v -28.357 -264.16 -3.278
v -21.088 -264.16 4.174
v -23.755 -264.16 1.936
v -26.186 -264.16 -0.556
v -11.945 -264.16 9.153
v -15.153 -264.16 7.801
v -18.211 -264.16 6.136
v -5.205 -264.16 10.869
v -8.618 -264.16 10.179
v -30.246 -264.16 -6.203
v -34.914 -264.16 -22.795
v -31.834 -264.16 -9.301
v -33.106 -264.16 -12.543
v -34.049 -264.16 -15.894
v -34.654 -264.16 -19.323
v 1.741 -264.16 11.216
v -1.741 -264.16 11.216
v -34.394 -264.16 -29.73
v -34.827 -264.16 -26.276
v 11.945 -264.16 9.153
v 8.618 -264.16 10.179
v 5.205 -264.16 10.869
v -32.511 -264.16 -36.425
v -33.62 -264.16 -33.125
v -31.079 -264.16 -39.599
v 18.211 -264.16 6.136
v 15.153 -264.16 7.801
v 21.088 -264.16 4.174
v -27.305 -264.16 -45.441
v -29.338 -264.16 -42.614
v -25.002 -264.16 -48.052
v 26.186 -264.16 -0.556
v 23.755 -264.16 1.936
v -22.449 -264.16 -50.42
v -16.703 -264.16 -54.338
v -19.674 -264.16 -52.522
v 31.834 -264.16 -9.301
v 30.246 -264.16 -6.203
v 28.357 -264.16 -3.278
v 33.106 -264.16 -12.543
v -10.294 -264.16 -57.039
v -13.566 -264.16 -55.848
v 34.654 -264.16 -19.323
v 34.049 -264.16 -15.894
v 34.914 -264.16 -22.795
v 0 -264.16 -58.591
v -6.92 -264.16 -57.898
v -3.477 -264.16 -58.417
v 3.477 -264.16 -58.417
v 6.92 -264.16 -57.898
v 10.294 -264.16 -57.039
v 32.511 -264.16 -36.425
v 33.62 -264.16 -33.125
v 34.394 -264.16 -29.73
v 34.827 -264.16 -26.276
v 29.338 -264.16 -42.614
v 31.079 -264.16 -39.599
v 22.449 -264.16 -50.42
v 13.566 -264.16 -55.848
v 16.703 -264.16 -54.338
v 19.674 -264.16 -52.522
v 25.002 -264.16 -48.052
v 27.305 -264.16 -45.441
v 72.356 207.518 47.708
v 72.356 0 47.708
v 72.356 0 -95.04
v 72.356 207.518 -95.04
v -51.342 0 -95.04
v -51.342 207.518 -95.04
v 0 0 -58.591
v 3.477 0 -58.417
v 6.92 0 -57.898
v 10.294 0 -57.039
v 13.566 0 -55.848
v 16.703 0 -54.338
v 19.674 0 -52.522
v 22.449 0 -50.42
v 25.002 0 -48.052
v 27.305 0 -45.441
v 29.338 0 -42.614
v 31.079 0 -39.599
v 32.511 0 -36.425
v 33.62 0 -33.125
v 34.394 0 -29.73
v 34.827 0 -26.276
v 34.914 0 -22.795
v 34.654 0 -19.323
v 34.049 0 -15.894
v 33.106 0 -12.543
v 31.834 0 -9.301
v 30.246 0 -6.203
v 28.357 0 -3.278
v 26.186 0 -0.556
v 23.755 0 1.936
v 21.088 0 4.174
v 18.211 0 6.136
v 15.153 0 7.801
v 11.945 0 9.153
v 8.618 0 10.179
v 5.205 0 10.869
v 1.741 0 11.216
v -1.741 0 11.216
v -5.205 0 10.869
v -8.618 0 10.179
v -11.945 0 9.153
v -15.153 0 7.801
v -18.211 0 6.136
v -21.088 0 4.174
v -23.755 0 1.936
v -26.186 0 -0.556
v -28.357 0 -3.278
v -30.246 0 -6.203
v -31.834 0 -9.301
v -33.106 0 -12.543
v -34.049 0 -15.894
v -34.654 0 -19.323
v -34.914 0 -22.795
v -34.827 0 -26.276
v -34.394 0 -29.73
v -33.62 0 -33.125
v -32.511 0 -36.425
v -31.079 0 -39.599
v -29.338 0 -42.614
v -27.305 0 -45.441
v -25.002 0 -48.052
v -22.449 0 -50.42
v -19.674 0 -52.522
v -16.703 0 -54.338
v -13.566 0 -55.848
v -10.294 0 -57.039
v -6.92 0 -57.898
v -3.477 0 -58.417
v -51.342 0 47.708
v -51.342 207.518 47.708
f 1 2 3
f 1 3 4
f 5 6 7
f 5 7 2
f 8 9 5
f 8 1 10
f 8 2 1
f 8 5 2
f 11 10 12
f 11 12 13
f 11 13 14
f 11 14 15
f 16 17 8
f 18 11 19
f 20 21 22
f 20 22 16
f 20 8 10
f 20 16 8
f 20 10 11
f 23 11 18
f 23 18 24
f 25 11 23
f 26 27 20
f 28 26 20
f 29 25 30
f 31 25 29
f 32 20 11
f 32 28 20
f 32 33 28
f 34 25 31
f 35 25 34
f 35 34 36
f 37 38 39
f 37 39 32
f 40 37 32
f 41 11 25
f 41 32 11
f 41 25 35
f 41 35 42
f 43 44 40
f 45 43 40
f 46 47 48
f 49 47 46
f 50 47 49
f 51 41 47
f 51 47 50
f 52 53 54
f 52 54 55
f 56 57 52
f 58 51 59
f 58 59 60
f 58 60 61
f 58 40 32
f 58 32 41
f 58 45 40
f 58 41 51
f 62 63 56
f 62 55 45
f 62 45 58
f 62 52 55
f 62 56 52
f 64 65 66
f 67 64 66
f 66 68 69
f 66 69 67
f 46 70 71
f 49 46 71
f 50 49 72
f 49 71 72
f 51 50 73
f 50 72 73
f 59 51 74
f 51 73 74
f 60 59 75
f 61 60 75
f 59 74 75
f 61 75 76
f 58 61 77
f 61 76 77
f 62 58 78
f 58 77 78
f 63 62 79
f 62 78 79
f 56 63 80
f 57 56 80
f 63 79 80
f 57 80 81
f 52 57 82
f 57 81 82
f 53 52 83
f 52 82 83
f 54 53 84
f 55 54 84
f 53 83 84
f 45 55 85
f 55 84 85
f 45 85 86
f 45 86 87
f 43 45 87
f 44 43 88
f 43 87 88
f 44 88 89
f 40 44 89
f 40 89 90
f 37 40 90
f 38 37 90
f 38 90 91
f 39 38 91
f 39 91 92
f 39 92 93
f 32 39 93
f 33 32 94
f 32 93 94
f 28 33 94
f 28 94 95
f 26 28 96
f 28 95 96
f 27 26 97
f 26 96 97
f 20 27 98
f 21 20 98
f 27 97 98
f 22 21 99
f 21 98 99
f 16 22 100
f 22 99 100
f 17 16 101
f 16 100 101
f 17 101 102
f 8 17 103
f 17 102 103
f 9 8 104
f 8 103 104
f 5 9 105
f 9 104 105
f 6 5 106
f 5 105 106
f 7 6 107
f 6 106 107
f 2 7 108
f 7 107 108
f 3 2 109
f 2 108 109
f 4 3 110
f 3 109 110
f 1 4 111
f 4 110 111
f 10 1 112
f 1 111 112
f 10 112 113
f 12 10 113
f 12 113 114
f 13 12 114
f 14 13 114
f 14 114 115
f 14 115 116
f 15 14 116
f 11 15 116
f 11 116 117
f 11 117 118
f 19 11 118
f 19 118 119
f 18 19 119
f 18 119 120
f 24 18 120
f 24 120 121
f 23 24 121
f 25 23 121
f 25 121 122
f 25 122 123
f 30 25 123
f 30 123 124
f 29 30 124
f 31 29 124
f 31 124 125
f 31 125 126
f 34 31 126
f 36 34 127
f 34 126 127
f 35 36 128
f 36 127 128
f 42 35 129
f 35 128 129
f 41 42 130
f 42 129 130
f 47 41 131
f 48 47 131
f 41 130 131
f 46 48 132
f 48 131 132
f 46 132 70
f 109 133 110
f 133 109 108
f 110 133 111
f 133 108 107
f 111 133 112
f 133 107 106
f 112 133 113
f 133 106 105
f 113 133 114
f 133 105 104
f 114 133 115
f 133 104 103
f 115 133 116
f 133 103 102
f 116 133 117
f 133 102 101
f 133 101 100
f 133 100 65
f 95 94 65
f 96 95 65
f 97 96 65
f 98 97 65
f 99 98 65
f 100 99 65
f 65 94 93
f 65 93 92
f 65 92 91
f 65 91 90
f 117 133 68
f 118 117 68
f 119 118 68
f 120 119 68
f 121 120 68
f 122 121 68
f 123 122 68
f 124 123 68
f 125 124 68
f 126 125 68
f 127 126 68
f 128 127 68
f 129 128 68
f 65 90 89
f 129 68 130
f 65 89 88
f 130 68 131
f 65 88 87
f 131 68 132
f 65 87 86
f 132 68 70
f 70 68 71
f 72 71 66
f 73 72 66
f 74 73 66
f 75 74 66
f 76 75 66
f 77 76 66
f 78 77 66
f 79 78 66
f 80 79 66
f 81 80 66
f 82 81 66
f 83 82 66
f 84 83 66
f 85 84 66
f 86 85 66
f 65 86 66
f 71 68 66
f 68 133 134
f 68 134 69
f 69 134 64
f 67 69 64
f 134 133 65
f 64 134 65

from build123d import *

# Parameters (mm, degrees)
SKETCH1_W      = 123.698
SKETCH1_H      = 142.748
EXTRUDE1_DEPTH = 207.518
SKETCH2_R      = 34.925
EXTRUDE2_DEPTH = 264.16


with BuildPart() as part:
    # Sketch1 → Extrude1 (new body)
    with BuildSketch(Plane(origin=(0, 0, 0), x_dir=(1, 0, 0), z_dir=(0, 1, 0))):
        with Locations((10.507234487, 23.665651739)):
            Rectangle(SKETCH1_W, SKETCH1_H)
    extrude(amount=EXTRUDE1_DEPTH)

    # Sketch2 → Extrude2 (add)
    with BuildSketch(Plane.XZ):
        with Locations(Location((0, -23.665651739, 0), (0, 0, 270))):
            Circle(SKETCH2_R)
    extrude(amount=EXTRUDE2_DEPTH)


solid = part.part
